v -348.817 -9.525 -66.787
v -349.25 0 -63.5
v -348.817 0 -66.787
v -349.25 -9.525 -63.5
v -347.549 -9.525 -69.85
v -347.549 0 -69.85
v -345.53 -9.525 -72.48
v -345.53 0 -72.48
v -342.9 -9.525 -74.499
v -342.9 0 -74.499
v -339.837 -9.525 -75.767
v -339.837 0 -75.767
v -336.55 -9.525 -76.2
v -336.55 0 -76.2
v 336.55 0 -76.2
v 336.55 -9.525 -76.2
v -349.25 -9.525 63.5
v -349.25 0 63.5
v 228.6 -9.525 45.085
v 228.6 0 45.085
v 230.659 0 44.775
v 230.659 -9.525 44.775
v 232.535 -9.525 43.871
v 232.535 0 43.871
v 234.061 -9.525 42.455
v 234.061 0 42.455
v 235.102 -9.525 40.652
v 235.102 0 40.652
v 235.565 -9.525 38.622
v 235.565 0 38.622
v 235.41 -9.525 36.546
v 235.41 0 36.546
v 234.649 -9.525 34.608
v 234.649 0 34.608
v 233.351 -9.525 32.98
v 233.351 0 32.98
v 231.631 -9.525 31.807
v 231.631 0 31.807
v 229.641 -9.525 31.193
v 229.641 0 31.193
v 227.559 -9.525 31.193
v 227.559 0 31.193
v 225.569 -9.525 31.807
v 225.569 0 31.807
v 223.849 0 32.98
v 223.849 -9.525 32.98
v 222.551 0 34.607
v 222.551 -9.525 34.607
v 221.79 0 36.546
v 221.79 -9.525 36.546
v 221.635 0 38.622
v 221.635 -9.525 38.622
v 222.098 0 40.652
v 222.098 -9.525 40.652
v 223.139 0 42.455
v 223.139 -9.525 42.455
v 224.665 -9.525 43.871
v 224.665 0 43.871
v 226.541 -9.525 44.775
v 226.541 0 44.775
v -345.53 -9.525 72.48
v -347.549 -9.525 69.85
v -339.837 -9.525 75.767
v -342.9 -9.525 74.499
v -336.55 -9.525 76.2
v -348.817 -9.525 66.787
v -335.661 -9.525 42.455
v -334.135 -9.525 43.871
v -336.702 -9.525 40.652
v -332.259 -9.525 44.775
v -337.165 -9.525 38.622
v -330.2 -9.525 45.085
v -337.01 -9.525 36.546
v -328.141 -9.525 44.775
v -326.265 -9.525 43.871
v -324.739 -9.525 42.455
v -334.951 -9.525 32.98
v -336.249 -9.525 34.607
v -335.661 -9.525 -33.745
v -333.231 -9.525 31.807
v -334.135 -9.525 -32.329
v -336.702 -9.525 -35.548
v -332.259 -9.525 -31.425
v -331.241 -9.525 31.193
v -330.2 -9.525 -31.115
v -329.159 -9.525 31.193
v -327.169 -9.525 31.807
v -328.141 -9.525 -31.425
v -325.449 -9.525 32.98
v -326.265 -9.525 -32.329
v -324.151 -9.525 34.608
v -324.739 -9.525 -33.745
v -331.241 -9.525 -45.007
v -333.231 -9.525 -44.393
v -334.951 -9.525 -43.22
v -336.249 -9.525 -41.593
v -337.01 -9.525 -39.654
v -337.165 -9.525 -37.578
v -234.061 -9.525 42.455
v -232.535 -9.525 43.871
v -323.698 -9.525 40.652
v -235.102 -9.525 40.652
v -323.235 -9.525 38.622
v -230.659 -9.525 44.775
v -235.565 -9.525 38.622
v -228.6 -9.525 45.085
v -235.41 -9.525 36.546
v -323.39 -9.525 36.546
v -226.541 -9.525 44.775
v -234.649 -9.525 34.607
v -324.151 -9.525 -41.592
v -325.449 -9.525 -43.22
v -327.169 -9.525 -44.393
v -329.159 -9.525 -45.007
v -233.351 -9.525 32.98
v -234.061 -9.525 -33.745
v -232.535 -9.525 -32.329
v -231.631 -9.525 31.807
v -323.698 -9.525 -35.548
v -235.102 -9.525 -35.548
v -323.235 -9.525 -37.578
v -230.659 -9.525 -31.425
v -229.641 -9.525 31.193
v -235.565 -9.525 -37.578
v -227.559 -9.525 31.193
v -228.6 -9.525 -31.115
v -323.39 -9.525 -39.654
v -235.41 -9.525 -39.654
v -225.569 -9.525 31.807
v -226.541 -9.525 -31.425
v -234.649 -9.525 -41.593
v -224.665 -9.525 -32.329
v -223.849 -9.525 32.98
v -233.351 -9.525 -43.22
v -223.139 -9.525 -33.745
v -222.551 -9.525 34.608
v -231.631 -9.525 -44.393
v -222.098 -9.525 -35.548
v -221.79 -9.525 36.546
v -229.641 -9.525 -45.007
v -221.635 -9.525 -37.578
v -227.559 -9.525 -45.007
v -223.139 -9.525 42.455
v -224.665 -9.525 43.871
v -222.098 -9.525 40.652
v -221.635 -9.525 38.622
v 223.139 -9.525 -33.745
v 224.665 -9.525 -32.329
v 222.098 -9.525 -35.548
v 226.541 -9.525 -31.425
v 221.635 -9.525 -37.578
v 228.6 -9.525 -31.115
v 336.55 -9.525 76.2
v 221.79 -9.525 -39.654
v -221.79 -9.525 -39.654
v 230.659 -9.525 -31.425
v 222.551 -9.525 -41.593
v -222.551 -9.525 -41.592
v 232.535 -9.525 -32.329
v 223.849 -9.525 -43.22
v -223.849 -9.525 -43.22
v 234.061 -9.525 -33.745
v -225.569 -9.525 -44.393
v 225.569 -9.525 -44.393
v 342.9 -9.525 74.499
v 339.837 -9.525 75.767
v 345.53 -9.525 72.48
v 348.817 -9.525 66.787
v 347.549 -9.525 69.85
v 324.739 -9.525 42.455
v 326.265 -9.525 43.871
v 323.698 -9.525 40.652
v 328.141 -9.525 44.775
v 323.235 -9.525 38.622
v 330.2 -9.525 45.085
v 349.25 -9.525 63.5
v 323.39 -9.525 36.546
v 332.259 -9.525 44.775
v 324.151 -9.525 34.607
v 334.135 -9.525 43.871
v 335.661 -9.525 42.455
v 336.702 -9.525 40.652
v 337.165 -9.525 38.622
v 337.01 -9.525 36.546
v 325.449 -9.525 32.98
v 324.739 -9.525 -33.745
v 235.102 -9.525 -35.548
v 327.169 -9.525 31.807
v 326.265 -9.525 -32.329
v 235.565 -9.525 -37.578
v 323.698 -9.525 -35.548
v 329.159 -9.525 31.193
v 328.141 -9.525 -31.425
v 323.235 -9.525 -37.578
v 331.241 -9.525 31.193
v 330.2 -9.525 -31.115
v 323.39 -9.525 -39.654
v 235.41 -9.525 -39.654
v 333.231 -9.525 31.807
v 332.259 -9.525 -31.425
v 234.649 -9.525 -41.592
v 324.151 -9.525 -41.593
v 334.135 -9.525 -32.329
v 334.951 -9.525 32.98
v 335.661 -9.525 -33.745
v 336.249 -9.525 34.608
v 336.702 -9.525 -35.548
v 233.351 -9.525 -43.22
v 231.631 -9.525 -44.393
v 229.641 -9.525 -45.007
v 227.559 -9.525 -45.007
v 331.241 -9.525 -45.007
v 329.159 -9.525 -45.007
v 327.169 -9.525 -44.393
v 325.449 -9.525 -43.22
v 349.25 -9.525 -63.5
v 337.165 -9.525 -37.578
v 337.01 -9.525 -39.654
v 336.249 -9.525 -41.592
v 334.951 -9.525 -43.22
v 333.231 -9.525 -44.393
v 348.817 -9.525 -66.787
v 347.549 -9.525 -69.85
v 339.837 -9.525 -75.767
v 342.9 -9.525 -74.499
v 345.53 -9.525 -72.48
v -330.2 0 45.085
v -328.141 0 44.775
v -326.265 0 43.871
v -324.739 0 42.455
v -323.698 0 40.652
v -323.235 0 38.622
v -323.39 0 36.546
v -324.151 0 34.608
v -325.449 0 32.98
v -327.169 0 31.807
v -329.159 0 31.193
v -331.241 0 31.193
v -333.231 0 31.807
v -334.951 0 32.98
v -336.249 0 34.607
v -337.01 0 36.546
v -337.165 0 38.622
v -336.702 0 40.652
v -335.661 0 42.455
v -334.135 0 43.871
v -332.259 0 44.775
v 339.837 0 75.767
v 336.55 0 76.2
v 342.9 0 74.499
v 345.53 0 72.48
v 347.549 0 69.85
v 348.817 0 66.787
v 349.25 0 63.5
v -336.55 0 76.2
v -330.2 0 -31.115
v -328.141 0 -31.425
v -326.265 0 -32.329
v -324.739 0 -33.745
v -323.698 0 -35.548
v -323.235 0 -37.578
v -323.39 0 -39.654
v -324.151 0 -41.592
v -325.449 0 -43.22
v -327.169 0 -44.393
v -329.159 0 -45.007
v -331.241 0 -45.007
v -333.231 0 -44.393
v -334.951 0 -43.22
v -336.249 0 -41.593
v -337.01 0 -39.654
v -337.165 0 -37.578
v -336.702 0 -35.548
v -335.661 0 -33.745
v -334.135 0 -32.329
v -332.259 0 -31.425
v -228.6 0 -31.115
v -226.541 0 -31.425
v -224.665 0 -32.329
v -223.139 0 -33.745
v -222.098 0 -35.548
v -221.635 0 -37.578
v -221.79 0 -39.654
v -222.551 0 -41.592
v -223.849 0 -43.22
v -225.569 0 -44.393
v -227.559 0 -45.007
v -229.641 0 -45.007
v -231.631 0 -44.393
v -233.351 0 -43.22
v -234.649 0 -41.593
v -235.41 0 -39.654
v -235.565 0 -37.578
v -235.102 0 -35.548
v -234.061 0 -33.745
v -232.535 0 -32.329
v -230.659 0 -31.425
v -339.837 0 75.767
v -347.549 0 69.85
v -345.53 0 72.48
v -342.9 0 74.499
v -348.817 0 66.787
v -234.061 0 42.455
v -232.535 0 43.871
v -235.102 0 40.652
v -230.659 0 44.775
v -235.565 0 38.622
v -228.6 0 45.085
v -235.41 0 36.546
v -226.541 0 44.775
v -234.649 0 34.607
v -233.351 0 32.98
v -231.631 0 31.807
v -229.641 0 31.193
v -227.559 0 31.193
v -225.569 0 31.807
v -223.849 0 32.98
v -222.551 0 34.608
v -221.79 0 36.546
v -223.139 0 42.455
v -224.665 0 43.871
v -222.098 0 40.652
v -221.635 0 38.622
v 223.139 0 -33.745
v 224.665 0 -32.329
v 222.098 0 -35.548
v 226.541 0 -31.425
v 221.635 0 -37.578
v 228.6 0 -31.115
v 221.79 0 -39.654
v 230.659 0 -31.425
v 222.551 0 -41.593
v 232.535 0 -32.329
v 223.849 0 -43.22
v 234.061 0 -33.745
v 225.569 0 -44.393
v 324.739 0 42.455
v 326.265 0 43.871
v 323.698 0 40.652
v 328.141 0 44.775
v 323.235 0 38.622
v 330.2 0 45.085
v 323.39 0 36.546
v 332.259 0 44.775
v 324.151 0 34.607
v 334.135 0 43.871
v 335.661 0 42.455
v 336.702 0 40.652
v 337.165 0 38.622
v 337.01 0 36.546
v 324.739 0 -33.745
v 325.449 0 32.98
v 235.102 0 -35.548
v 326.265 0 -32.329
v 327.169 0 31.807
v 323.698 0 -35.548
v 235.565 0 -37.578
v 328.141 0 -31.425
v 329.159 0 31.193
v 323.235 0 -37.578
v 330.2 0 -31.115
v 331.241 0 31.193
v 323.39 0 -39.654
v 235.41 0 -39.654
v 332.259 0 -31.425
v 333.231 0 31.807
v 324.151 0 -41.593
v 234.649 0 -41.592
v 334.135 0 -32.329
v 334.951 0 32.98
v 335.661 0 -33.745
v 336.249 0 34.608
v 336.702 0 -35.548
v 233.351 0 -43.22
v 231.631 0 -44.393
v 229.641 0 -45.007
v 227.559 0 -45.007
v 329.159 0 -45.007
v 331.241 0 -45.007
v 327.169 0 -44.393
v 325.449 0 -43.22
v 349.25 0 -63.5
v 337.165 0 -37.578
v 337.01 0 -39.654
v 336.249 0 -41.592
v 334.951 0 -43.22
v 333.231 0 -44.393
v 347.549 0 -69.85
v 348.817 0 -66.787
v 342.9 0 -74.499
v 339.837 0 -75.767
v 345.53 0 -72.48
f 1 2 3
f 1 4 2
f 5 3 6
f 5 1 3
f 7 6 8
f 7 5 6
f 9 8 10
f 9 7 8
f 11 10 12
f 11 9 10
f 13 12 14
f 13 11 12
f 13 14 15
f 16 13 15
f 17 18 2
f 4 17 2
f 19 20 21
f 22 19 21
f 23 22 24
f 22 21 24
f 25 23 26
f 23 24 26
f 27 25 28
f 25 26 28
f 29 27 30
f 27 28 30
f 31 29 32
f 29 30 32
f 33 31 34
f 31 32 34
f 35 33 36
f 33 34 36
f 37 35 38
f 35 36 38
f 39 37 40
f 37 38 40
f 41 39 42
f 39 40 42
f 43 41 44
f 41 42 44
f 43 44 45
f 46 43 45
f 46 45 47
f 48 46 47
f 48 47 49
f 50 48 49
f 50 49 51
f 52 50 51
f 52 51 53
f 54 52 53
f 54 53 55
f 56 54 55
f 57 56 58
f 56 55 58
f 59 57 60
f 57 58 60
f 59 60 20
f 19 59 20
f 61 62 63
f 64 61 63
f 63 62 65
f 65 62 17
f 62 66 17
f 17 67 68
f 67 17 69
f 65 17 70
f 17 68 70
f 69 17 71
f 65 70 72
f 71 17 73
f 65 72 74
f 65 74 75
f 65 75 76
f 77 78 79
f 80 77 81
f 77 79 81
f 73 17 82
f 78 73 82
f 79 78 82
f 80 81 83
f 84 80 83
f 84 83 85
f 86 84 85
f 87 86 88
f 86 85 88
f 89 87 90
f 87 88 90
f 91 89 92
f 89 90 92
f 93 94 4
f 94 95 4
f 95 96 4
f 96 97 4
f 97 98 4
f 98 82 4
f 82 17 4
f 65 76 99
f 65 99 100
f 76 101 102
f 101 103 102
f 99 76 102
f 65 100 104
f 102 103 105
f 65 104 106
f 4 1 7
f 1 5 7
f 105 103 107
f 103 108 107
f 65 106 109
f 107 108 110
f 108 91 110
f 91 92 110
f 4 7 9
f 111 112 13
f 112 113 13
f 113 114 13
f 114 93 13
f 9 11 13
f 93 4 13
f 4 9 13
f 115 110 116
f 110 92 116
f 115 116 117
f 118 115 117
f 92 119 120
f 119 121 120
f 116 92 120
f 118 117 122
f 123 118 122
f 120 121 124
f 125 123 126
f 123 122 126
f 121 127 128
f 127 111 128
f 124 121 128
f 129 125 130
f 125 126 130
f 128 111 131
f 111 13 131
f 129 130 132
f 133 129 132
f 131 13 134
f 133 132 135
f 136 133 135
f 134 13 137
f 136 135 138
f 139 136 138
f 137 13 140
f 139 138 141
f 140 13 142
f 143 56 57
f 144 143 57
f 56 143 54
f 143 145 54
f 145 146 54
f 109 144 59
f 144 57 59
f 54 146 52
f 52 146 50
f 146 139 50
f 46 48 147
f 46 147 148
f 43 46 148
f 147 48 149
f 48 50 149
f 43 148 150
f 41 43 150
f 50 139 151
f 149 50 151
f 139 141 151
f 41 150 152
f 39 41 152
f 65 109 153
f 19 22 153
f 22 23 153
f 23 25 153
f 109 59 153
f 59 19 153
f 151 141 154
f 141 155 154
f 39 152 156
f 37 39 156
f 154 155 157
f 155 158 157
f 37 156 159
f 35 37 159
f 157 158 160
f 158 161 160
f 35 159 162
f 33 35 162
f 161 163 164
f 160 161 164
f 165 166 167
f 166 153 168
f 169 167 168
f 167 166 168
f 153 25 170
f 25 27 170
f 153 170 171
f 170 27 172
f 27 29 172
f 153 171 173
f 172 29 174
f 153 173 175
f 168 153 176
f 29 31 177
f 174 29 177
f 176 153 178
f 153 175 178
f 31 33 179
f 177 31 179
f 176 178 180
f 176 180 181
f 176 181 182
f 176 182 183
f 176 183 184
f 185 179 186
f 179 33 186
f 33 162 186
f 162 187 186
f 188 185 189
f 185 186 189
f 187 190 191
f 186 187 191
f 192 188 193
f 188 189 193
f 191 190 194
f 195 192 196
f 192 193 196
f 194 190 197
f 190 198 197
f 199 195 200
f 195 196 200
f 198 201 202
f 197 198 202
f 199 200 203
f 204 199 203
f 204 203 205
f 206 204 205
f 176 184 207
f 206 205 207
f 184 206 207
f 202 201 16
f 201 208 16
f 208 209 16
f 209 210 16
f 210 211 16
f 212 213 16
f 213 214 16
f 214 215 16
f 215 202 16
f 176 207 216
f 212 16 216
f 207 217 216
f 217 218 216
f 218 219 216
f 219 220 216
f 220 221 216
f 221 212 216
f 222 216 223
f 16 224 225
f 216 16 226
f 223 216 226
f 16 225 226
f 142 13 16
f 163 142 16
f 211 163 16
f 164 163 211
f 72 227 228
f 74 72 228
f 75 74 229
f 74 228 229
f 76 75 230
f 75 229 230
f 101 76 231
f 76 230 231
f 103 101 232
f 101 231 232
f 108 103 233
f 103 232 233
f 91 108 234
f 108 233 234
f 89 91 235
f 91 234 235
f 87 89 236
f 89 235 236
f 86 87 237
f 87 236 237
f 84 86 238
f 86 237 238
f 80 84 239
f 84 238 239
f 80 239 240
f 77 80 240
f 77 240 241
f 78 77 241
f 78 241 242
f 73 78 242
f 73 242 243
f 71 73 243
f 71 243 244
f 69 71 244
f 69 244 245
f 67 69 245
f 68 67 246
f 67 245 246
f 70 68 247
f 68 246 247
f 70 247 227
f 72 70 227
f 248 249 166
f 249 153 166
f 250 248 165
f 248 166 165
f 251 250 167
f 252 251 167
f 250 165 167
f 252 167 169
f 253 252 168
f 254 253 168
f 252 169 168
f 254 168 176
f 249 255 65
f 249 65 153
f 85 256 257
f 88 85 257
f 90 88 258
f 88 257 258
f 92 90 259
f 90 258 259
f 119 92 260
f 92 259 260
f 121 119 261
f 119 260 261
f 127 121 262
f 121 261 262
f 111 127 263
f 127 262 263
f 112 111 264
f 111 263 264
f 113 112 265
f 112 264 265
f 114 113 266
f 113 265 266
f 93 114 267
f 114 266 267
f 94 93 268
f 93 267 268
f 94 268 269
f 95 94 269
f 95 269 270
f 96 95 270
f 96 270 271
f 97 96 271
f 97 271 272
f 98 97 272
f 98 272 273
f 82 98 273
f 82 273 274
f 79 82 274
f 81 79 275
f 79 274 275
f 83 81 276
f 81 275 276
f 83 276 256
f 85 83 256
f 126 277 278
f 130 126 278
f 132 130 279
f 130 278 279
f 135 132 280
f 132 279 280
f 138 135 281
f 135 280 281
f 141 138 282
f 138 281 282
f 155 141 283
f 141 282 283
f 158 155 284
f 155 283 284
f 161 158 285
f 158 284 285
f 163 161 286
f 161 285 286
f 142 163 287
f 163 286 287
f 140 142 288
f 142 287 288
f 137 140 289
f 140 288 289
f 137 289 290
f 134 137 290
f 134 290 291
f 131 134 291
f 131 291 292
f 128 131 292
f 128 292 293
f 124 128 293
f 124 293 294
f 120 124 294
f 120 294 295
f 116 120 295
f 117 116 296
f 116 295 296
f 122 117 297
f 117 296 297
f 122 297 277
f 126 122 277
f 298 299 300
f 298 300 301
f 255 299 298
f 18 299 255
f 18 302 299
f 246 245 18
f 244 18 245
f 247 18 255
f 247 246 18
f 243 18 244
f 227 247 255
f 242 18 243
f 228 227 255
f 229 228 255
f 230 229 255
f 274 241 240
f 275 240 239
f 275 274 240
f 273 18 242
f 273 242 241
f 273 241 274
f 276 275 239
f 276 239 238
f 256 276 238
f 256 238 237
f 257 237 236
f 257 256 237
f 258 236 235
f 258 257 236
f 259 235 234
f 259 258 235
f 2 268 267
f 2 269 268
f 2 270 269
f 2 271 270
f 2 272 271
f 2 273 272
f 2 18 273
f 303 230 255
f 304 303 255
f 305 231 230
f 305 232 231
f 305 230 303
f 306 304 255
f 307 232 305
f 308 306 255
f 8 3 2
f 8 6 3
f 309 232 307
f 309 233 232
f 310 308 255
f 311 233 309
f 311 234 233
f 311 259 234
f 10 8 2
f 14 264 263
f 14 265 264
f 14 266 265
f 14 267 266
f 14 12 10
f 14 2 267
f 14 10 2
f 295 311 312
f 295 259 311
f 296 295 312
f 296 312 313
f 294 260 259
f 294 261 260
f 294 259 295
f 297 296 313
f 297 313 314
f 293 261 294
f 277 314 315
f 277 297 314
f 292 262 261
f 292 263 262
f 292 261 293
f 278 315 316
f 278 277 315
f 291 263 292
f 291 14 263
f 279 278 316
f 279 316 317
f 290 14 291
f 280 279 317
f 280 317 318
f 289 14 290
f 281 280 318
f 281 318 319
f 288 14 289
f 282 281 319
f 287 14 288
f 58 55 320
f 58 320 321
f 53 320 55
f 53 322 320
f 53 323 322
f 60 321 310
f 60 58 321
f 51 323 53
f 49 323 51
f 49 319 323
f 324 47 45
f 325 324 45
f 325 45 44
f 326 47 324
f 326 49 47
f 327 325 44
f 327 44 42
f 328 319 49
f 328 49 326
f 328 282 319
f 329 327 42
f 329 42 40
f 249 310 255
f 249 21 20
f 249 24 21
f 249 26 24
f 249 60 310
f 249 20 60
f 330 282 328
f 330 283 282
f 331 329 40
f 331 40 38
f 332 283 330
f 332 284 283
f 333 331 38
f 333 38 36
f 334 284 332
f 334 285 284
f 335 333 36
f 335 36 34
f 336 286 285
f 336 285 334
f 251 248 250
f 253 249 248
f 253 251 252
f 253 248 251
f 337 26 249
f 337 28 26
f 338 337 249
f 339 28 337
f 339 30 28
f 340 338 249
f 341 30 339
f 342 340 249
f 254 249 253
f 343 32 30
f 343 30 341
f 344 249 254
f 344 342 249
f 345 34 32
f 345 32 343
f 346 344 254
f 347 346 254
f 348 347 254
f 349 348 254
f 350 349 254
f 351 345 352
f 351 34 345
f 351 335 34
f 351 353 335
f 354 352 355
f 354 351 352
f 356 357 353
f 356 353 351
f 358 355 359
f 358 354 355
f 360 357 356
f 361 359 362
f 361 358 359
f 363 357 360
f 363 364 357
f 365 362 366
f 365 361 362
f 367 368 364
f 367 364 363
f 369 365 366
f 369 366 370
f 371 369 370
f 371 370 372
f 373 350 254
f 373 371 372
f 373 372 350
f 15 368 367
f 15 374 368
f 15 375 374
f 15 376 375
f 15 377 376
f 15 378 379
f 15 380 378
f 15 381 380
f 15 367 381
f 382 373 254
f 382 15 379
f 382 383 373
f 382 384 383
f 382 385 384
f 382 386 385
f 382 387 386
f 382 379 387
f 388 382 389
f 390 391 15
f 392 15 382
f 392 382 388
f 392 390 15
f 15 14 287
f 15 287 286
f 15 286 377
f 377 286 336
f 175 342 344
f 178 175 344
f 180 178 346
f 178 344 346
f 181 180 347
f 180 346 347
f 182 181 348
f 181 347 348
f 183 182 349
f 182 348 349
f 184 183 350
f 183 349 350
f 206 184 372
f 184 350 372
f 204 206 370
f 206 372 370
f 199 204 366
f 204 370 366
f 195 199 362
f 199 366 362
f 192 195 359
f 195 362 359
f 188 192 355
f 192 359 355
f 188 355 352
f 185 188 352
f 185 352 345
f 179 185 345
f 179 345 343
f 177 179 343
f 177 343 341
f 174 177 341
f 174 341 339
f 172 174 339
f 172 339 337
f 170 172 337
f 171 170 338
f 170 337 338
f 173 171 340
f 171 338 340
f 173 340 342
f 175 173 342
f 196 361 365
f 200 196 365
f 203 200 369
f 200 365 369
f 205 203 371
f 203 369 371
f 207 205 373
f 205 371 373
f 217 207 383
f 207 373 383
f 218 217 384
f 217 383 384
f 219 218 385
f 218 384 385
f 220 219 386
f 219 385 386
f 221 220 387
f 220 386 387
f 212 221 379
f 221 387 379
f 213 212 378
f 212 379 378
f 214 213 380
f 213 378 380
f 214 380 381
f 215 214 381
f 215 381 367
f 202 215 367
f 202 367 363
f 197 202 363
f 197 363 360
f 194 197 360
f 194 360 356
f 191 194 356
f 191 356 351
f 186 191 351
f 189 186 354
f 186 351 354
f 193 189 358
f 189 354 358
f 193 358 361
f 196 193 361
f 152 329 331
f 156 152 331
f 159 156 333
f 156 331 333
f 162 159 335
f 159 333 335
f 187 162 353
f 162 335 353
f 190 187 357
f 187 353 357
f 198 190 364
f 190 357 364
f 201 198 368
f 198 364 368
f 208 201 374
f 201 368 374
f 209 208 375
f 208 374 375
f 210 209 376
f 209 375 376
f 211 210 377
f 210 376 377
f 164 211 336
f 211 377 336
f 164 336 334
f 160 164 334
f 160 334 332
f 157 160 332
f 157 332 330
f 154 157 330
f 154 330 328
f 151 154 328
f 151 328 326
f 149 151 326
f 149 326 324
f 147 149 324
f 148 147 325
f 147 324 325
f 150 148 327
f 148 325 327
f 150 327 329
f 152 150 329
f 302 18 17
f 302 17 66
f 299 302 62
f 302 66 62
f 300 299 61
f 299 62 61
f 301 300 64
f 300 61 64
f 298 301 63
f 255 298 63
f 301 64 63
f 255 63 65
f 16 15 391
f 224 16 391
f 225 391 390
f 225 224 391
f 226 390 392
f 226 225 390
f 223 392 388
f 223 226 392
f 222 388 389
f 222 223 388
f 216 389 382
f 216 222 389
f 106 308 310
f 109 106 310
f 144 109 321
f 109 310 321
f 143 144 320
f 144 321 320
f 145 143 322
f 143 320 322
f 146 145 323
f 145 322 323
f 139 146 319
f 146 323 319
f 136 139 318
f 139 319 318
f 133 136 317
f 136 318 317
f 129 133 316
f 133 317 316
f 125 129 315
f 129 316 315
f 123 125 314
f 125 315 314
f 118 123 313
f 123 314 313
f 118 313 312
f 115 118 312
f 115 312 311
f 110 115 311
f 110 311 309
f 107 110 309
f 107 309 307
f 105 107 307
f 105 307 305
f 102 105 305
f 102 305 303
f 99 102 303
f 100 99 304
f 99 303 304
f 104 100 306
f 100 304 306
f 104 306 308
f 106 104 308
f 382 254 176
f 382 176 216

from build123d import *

# Parameters (mm, degrees)
SKETCH1_W          = 698.5
SKETCH1_H          = 152.4
SKETCH1_R          = 6.985
BASE_FLANGE1_DEPTH = 9.525
FILLET1_R          = 12.7


# Sheet-metal steps are written as plain solids
with BuildPart() as part:
    # Sketch1 → Base-Flange1 (new body)
    with BuildSketch(Plane(origin=(0, 0, 0), x_dir=(1, 0, 0), z_dir=(0, 1, 0))):
        Rectangle(SKETCH1_W, SKETCH1_H)
        with Locations(Location((228.6, 38.1, 0), (0, 0, 270))):
            Circle(SKETCH1_R, mode=Mode.SUBTRACT)
        with Locations(Location((330.2, 38.1, 0), (0, 0, 270))):
            Circle(SKETCH1_R, mode=Mode.SUBTRACT)
        with Locations(Location((330.2, -38.1, 0), (0, 0, 270))):
            Circle(SKETCH1_R, mode=Mode.SUBTRACT)
        with Locations(Location((228.6, -38.1, 0), (0, 0, 270))):
            Circle(SKETCH1_R, mode=Mode.SUBTRACT)
        with Locations(Location((-228.6, -38.1, 0), (0, 0, 270))):
            Circle(SKETCH1_R, mode=Mode.SUBTRACT)
        with Locations(Location((-330.2, -38.1, 0), (0, 0, 270))):
            Circle(SKETCH1_R, mode=Mode.SUBTRACT)
        with Locations(Location((-330.2, 38.1, 0), (0, 0, 270))):
            Circle(SKETCH1_R, mode=Mode.SUBTRACT)
        with Locations(Location((-228.6, 38.1, 0), (0, 0, 270))):
            Circle(SKETCH1_R, mode=Mode.SUBTRACT)
    extrude(amount=-BASE_FLANGE1_DEPTH)

    # Fillet1
    fillet1_edges = [part.edges().sort_by_distance(p)[0] for p in [
        (349.25, -4.7625, 76.2),
        (-349.25, -4.7625, 76.2),
        (-349.25, -4.7625, -76.2),
        (349.25, -4.7625, -76.2),
    ]]
    fillet(fillet1_edges, radius=FILLET1_R)


solid = part.part
